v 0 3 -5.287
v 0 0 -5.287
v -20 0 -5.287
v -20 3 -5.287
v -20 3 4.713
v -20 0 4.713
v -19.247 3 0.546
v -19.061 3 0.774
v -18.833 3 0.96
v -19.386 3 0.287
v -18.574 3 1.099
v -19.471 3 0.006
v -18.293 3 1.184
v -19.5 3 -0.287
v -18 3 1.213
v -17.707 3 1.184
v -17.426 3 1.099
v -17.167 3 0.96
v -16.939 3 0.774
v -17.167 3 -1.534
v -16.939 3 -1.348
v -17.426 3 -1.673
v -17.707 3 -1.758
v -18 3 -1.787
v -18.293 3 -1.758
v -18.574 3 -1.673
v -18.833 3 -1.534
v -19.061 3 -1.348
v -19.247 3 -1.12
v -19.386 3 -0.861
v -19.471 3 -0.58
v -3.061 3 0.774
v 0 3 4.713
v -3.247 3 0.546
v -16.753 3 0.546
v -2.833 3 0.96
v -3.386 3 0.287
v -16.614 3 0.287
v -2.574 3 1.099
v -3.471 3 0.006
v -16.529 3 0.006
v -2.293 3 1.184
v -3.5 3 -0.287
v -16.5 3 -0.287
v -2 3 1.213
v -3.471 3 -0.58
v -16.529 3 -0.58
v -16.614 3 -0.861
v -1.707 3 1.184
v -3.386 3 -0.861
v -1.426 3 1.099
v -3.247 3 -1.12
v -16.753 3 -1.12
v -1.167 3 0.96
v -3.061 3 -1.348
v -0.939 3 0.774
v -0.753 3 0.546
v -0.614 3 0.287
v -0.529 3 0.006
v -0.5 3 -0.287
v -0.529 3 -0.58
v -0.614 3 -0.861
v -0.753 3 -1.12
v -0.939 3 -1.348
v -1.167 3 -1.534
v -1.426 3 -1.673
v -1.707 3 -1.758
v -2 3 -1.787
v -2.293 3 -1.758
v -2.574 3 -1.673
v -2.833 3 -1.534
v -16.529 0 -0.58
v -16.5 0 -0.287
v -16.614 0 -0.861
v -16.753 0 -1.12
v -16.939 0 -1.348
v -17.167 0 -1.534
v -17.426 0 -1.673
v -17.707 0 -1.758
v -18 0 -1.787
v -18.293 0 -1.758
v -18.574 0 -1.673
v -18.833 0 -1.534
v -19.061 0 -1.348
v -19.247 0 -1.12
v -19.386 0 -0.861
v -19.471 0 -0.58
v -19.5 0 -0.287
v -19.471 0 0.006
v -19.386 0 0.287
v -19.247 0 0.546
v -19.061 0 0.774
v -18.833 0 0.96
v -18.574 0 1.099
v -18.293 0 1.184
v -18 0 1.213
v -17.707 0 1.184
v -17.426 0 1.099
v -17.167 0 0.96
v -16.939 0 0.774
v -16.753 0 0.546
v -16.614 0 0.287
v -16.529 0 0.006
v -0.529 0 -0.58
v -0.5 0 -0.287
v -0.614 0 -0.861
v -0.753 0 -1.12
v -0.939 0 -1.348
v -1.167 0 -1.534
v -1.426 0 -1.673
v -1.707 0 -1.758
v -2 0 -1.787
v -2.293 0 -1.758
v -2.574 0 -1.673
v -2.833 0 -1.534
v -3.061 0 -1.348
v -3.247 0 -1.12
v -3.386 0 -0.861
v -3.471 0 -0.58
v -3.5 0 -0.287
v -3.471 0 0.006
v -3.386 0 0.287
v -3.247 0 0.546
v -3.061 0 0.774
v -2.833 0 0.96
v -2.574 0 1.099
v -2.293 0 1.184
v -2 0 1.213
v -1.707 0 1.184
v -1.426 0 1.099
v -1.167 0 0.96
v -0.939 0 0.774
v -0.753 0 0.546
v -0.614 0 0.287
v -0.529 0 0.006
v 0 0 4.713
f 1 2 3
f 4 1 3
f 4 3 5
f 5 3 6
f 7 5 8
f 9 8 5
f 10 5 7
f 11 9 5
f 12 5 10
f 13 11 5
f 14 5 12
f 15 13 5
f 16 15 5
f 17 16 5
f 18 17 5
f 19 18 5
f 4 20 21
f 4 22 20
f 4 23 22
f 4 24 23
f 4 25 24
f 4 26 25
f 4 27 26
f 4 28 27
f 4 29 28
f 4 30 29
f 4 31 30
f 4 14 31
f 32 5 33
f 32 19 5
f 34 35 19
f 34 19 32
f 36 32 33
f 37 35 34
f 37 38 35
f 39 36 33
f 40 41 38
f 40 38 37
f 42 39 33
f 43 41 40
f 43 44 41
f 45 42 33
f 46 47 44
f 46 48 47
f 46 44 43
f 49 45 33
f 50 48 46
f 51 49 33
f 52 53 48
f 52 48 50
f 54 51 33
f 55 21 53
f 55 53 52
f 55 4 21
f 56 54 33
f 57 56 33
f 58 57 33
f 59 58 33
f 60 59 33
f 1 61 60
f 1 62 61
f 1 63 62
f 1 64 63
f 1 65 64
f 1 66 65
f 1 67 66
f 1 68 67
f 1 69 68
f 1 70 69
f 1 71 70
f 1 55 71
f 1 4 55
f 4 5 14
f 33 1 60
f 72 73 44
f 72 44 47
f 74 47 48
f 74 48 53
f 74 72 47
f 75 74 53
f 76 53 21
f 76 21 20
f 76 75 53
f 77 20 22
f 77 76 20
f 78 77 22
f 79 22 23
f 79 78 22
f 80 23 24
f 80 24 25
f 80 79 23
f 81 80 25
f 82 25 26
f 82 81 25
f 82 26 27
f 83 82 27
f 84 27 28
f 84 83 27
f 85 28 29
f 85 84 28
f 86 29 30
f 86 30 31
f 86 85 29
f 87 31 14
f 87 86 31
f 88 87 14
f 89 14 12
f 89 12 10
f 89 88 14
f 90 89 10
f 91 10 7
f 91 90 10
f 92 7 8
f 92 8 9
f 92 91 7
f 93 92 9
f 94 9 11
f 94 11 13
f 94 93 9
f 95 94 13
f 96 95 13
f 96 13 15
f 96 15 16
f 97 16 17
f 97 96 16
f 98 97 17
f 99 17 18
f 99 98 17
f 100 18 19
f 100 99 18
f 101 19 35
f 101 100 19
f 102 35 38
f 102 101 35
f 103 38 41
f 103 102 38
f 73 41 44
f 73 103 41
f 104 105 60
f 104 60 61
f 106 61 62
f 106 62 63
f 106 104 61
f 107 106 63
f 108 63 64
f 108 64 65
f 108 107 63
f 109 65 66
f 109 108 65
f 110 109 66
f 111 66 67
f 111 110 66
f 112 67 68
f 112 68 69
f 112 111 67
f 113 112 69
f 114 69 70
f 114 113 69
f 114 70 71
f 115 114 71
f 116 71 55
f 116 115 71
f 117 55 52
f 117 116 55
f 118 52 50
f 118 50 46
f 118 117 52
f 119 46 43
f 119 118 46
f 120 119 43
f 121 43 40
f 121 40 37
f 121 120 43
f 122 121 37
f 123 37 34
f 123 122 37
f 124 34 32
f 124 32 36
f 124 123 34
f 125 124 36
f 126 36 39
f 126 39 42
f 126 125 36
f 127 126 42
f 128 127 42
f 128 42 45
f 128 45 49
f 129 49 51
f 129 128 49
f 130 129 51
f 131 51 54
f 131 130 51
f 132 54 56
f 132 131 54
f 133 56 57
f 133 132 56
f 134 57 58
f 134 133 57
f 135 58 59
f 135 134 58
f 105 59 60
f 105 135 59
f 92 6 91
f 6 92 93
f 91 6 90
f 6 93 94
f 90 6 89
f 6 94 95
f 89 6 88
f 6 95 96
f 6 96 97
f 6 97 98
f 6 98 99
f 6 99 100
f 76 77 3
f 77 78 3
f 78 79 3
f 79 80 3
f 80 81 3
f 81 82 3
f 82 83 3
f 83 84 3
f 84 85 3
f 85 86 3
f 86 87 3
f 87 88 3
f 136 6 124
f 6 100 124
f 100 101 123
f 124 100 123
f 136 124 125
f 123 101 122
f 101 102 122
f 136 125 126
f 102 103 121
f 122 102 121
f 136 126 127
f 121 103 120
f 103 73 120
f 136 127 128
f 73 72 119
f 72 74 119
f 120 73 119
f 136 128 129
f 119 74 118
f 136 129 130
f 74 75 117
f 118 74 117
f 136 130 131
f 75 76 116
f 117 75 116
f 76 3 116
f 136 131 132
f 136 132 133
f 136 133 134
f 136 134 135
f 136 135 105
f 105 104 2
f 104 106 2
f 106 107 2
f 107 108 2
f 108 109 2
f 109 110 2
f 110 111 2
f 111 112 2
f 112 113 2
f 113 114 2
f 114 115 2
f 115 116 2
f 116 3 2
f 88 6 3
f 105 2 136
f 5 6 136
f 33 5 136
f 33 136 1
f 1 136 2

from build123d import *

# Parameters (mm, degrees)
SKETCH_1_R      = 1.5
EXTRUDE_1_DEPTH = 3


with BuildPart() as part:
    # 草图1 → 凸台-拉伸1 (new body)
    with BuildSketch(Plane(origin=(0, 0, 0), x_dir=(1, 0, 0), z_dir=(0, 1, 0))):
        Polygon((0, 0), (0, 5.286885246), (-20, 5.286885246), (-20, -4.713114754), (0, -4.713114754), align=None)
        with Locations((-18, 0.286885246)):
            Circle(SKETCH_1_R, mode=Mode.SUBTRACT)
        with Locations((-2, 0.286885246)):
            Circle(SKETCH_1_R, mode=Mode.SUBTRACT)
    extrude(amount=EXTRUDE_1_DEPTH)


solid = part.part
